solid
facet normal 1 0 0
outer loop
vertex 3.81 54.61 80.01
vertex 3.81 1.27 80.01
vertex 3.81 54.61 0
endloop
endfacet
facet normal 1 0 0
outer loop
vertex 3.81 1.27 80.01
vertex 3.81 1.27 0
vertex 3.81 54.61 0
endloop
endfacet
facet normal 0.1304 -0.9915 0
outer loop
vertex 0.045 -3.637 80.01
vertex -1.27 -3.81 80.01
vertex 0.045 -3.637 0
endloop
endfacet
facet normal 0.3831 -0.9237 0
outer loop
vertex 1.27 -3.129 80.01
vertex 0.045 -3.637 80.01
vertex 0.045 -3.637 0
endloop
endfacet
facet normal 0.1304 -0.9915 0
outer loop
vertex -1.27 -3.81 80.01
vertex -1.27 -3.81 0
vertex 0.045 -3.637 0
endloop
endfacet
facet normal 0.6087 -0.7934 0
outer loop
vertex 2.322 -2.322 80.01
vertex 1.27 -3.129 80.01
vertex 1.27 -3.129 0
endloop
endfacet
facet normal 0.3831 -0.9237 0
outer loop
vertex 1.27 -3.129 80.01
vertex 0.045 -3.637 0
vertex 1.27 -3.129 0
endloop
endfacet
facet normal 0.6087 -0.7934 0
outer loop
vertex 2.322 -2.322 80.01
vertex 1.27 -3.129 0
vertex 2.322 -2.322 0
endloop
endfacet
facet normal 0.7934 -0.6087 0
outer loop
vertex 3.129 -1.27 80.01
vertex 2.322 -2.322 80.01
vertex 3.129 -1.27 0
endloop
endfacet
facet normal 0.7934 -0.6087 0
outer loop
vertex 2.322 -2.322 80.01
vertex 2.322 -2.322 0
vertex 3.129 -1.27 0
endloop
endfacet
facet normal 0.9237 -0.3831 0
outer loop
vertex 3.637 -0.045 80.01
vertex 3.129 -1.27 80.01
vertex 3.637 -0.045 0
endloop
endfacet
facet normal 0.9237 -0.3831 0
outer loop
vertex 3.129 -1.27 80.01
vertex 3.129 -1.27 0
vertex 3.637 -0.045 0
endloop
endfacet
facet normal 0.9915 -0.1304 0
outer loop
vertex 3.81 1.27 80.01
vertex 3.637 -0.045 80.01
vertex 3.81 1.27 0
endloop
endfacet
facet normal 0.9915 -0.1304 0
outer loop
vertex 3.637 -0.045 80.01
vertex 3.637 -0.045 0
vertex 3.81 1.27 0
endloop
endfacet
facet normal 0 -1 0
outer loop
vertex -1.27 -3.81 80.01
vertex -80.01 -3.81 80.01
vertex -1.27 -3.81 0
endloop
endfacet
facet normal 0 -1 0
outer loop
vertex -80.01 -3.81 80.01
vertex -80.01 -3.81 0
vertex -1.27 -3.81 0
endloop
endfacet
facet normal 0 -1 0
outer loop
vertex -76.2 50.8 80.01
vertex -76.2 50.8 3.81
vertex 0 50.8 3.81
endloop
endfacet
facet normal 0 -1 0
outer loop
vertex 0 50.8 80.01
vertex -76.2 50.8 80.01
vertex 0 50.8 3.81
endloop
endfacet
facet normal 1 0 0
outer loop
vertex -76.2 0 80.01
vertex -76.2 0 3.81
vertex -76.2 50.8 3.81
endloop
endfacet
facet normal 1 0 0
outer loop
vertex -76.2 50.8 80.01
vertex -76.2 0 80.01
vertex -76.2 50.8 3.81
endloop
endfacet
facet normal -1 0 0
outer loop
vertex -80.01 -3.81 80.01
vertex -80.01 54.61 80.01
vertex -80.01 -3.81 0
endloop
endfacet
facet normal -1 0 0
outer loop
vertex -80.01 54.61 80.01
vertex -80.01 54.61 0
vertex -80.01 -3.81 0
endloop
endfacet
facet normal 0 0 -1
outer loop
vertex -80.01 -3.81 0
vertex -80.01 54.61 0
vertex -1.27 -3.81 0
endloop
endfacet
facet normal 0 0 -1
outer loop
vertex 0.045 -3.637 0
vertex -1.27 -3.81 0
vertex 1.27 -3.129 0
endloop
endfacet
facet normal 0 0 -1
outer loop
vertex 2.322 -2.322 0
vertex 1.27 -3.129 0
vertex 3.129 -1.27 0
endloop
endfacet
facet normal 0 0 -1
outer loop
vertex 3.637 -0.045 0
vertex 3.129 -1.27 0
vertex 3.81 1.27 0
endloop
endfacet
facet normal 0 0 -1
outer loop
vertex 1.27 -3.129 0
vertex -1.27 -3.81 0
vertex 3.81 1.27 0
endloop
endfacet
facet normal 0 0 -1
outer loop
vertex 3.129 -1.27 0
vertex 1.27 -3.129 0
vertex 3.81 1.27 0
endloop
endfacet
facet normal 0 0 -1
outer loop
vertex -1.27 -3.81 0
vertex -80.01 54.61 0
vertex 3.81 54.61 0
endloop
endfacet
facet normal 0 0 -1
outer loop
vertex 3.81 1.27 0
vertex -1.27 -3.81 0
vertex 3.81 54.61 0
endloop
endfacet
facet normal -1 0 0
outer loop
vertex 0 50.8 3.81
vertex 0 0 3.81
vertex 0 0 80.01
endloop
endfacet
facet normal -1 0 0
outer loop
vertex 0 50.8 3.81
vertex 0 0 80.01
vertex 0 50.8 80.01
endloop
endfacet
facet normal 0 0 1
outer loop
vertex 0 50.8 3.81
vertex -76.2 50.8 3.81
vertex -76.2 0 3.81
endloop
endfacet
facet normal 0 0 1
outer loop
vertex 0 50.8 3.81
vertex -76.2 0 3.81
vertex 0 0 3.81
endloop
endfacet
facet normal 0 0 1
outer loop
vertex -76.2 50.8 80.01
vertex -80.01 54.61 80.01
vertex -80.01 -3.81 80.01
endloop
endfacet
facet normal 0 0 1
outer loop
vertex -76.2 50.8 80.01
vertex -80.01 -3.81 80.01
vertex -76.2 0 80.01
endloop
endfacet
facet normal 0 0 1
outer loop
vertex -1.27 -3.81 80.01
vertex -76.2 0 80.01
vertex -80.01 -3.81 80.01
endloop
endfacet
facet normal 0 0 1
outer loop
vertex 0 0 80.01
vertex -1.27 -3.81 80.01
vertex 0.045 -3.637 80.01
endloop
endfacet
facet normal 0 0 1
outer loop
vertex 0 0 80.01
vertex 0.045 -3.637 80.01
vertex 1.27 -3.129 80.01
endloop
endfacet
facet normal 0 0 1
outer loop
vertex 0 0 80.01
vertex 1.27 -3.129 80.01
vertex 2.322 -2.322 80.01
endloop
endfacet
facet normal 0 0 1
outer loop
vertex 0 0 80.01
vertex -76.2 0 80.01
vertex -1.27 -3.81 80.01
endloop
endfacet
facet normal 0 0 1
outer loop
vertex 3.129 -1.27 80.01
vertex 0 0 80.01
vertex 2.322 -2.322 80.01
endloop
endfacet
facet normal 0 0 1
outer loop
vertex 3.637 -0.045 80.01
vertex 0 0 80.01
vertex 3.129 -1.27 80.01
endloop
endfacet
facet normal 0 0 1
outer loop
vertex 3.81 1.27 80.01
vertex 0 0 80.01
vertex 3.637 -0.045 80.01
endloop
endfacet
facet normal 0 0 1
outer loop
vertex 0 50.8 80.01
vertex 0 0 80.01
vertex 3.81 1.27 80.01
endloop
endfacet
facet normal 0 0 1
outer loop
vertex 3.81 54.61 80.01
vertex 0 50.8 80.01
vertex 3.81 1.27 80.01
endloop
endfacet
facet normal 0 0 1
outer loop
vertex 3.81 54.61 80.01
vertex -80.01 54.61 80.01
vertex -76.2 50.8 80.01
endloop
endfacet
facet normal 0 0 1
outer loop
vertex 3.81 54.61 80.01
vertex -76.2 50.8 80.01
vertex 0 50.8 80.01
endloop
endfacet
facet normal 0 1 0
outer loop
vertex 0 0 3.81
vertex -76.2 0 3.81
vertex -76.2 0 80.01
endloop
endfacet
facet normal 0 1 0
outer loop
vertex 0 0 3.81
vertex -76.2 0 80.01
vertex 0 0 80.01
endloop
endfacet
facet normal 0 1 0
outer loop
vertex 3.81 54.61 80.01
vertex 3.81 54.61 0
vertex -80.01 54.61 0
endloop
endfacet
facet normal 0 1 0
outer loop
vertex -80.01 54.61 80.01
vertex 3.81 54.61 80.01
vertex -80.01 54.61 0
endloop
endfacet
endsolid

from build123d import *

# Parameters (mm, degrees)
F1_DEPTH = 3.81
F2_W     = 76.2
F2_H     = 50.8
F3_DEPTH = 76.2
F4_R     = 5.08


with BuildPart() as f1:
    # F0 (on Top) → F1 (new body)
    with BuildSketch(Plane.XY):
        Polygon((-80.01, 54.61), (-80.01, 50.8), (-80.01, -3.81), (0, -3.81), (3.81, -3.81), (3.81, 0), (3.81, 54.61), (-76.2, 54.61), align=None)
    extrude(amount=F1_DEPTH)

    # F2 (on face) → F3 (join)
    with BuildSketch(Plane.XY.offset(3.81)):
        Polygon((3.81, 54.61), (-76.2, 54.61), (-80.01, 54.61), (-80.01, 50.8), (-80.01, -3.81), (0, -3.81), (3.81, -3.81), (3.81, 0), align=None)
        with Locations((-38.1, 25.4)):
            Rectangle(F2_W, F2_H, mode=Mode.SUBTRACT)
    extrude(amount=F3_DEPTH)

    # F4
    f4_edges = [f1.edges().sort_by_distance(p)[0] for p in [
        (3.81, -3.81, 40.005),
    ]]
    fillet(f4_edges, radius=F4_R)


solid = f1.part
